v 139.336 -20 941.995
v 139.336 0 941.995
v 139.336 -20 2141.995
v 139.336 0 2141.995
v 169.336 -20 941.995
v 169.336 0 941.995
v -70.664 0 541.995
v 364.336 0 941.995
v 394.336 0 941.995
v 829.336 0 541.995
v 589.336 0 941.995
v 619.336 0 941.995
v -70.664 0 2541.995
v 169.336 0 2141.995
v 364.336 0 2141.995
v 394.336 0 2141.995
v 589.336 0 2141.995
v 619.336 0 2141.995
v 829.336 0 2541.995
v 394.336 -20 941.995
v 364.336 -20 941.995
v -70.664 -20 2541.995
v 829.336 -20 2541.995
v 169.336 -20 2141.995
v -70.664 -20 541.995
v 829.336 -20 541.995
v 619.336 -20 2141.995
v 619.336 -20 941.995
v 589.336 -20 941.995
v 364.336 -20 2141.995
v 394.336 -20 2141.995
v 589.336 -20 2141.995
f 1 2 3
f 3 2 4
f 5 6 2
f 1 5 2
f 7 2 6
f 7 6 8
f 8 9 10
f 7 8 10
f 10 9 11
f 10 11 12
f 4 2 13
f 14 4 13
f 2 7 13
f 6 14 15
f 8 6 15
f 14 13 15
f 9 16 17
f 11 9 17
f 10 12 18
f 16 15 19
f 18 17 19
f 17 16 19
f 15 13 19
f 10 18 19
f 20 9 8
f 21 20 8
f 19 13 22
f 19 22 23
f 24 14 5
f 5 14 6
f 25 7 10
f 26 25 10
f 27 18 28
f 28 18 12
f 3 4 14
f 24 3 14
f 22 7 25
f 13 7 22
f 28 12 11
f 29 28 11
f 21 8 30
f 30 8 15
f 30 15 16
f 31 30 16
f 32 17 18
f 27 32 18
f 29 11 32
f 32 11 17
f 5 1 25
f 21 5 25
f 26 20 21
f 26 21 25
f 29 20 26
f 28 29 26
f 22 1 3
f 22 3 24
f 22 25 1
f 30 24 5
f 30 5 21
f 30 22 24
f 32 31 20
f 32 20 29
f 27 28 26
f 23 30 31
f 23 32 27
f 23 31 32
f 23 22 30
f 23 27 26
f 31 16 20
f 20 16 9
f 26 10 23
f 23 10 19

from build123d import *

# Parameters (mm, degrees)
F0_W     = 900
F0_H     = 2000
F1_DEPTH = 20


with BuildPart() as f1:
    # F0 (on Front) → F1 (new body)
    with BuildSketch(Plane.XZ):
        with Locations((379.336354, 1541.994798)):
            Rectangle(F0_W, F0_H)
        Polygon((139.336354, 2141.994798), (154.336354, 2141.994798), (169.336354, 2141.994798), (169.336354, 941.994798), (139.336354, 941.994798), align=None, mode=Mode.SUBTRACT)
        Polygon((364.336354, 1841.994798), (364.336354, 2141.994798), (379.336354, 2141.994798), (394.336354, 2141.994798), (394.336354, 1341.994798), (394.336354, 941.994798), (364.336354, 941.994798), align=None, mode=Mode.SUBTRACT)
        Polygon((619.336354, 2141.994798), (619.336354, 1341.994798), (619.336354, 1041.994798), (619.336354, 941.994798), (589.336354, 941.994798), (589.336354, 1341.994798), (589.336354, 2141.994798), align=None, mode=Mode.SUBTRACT)
    extrude(amount=F1_DEPTH)


solid = f1.part
